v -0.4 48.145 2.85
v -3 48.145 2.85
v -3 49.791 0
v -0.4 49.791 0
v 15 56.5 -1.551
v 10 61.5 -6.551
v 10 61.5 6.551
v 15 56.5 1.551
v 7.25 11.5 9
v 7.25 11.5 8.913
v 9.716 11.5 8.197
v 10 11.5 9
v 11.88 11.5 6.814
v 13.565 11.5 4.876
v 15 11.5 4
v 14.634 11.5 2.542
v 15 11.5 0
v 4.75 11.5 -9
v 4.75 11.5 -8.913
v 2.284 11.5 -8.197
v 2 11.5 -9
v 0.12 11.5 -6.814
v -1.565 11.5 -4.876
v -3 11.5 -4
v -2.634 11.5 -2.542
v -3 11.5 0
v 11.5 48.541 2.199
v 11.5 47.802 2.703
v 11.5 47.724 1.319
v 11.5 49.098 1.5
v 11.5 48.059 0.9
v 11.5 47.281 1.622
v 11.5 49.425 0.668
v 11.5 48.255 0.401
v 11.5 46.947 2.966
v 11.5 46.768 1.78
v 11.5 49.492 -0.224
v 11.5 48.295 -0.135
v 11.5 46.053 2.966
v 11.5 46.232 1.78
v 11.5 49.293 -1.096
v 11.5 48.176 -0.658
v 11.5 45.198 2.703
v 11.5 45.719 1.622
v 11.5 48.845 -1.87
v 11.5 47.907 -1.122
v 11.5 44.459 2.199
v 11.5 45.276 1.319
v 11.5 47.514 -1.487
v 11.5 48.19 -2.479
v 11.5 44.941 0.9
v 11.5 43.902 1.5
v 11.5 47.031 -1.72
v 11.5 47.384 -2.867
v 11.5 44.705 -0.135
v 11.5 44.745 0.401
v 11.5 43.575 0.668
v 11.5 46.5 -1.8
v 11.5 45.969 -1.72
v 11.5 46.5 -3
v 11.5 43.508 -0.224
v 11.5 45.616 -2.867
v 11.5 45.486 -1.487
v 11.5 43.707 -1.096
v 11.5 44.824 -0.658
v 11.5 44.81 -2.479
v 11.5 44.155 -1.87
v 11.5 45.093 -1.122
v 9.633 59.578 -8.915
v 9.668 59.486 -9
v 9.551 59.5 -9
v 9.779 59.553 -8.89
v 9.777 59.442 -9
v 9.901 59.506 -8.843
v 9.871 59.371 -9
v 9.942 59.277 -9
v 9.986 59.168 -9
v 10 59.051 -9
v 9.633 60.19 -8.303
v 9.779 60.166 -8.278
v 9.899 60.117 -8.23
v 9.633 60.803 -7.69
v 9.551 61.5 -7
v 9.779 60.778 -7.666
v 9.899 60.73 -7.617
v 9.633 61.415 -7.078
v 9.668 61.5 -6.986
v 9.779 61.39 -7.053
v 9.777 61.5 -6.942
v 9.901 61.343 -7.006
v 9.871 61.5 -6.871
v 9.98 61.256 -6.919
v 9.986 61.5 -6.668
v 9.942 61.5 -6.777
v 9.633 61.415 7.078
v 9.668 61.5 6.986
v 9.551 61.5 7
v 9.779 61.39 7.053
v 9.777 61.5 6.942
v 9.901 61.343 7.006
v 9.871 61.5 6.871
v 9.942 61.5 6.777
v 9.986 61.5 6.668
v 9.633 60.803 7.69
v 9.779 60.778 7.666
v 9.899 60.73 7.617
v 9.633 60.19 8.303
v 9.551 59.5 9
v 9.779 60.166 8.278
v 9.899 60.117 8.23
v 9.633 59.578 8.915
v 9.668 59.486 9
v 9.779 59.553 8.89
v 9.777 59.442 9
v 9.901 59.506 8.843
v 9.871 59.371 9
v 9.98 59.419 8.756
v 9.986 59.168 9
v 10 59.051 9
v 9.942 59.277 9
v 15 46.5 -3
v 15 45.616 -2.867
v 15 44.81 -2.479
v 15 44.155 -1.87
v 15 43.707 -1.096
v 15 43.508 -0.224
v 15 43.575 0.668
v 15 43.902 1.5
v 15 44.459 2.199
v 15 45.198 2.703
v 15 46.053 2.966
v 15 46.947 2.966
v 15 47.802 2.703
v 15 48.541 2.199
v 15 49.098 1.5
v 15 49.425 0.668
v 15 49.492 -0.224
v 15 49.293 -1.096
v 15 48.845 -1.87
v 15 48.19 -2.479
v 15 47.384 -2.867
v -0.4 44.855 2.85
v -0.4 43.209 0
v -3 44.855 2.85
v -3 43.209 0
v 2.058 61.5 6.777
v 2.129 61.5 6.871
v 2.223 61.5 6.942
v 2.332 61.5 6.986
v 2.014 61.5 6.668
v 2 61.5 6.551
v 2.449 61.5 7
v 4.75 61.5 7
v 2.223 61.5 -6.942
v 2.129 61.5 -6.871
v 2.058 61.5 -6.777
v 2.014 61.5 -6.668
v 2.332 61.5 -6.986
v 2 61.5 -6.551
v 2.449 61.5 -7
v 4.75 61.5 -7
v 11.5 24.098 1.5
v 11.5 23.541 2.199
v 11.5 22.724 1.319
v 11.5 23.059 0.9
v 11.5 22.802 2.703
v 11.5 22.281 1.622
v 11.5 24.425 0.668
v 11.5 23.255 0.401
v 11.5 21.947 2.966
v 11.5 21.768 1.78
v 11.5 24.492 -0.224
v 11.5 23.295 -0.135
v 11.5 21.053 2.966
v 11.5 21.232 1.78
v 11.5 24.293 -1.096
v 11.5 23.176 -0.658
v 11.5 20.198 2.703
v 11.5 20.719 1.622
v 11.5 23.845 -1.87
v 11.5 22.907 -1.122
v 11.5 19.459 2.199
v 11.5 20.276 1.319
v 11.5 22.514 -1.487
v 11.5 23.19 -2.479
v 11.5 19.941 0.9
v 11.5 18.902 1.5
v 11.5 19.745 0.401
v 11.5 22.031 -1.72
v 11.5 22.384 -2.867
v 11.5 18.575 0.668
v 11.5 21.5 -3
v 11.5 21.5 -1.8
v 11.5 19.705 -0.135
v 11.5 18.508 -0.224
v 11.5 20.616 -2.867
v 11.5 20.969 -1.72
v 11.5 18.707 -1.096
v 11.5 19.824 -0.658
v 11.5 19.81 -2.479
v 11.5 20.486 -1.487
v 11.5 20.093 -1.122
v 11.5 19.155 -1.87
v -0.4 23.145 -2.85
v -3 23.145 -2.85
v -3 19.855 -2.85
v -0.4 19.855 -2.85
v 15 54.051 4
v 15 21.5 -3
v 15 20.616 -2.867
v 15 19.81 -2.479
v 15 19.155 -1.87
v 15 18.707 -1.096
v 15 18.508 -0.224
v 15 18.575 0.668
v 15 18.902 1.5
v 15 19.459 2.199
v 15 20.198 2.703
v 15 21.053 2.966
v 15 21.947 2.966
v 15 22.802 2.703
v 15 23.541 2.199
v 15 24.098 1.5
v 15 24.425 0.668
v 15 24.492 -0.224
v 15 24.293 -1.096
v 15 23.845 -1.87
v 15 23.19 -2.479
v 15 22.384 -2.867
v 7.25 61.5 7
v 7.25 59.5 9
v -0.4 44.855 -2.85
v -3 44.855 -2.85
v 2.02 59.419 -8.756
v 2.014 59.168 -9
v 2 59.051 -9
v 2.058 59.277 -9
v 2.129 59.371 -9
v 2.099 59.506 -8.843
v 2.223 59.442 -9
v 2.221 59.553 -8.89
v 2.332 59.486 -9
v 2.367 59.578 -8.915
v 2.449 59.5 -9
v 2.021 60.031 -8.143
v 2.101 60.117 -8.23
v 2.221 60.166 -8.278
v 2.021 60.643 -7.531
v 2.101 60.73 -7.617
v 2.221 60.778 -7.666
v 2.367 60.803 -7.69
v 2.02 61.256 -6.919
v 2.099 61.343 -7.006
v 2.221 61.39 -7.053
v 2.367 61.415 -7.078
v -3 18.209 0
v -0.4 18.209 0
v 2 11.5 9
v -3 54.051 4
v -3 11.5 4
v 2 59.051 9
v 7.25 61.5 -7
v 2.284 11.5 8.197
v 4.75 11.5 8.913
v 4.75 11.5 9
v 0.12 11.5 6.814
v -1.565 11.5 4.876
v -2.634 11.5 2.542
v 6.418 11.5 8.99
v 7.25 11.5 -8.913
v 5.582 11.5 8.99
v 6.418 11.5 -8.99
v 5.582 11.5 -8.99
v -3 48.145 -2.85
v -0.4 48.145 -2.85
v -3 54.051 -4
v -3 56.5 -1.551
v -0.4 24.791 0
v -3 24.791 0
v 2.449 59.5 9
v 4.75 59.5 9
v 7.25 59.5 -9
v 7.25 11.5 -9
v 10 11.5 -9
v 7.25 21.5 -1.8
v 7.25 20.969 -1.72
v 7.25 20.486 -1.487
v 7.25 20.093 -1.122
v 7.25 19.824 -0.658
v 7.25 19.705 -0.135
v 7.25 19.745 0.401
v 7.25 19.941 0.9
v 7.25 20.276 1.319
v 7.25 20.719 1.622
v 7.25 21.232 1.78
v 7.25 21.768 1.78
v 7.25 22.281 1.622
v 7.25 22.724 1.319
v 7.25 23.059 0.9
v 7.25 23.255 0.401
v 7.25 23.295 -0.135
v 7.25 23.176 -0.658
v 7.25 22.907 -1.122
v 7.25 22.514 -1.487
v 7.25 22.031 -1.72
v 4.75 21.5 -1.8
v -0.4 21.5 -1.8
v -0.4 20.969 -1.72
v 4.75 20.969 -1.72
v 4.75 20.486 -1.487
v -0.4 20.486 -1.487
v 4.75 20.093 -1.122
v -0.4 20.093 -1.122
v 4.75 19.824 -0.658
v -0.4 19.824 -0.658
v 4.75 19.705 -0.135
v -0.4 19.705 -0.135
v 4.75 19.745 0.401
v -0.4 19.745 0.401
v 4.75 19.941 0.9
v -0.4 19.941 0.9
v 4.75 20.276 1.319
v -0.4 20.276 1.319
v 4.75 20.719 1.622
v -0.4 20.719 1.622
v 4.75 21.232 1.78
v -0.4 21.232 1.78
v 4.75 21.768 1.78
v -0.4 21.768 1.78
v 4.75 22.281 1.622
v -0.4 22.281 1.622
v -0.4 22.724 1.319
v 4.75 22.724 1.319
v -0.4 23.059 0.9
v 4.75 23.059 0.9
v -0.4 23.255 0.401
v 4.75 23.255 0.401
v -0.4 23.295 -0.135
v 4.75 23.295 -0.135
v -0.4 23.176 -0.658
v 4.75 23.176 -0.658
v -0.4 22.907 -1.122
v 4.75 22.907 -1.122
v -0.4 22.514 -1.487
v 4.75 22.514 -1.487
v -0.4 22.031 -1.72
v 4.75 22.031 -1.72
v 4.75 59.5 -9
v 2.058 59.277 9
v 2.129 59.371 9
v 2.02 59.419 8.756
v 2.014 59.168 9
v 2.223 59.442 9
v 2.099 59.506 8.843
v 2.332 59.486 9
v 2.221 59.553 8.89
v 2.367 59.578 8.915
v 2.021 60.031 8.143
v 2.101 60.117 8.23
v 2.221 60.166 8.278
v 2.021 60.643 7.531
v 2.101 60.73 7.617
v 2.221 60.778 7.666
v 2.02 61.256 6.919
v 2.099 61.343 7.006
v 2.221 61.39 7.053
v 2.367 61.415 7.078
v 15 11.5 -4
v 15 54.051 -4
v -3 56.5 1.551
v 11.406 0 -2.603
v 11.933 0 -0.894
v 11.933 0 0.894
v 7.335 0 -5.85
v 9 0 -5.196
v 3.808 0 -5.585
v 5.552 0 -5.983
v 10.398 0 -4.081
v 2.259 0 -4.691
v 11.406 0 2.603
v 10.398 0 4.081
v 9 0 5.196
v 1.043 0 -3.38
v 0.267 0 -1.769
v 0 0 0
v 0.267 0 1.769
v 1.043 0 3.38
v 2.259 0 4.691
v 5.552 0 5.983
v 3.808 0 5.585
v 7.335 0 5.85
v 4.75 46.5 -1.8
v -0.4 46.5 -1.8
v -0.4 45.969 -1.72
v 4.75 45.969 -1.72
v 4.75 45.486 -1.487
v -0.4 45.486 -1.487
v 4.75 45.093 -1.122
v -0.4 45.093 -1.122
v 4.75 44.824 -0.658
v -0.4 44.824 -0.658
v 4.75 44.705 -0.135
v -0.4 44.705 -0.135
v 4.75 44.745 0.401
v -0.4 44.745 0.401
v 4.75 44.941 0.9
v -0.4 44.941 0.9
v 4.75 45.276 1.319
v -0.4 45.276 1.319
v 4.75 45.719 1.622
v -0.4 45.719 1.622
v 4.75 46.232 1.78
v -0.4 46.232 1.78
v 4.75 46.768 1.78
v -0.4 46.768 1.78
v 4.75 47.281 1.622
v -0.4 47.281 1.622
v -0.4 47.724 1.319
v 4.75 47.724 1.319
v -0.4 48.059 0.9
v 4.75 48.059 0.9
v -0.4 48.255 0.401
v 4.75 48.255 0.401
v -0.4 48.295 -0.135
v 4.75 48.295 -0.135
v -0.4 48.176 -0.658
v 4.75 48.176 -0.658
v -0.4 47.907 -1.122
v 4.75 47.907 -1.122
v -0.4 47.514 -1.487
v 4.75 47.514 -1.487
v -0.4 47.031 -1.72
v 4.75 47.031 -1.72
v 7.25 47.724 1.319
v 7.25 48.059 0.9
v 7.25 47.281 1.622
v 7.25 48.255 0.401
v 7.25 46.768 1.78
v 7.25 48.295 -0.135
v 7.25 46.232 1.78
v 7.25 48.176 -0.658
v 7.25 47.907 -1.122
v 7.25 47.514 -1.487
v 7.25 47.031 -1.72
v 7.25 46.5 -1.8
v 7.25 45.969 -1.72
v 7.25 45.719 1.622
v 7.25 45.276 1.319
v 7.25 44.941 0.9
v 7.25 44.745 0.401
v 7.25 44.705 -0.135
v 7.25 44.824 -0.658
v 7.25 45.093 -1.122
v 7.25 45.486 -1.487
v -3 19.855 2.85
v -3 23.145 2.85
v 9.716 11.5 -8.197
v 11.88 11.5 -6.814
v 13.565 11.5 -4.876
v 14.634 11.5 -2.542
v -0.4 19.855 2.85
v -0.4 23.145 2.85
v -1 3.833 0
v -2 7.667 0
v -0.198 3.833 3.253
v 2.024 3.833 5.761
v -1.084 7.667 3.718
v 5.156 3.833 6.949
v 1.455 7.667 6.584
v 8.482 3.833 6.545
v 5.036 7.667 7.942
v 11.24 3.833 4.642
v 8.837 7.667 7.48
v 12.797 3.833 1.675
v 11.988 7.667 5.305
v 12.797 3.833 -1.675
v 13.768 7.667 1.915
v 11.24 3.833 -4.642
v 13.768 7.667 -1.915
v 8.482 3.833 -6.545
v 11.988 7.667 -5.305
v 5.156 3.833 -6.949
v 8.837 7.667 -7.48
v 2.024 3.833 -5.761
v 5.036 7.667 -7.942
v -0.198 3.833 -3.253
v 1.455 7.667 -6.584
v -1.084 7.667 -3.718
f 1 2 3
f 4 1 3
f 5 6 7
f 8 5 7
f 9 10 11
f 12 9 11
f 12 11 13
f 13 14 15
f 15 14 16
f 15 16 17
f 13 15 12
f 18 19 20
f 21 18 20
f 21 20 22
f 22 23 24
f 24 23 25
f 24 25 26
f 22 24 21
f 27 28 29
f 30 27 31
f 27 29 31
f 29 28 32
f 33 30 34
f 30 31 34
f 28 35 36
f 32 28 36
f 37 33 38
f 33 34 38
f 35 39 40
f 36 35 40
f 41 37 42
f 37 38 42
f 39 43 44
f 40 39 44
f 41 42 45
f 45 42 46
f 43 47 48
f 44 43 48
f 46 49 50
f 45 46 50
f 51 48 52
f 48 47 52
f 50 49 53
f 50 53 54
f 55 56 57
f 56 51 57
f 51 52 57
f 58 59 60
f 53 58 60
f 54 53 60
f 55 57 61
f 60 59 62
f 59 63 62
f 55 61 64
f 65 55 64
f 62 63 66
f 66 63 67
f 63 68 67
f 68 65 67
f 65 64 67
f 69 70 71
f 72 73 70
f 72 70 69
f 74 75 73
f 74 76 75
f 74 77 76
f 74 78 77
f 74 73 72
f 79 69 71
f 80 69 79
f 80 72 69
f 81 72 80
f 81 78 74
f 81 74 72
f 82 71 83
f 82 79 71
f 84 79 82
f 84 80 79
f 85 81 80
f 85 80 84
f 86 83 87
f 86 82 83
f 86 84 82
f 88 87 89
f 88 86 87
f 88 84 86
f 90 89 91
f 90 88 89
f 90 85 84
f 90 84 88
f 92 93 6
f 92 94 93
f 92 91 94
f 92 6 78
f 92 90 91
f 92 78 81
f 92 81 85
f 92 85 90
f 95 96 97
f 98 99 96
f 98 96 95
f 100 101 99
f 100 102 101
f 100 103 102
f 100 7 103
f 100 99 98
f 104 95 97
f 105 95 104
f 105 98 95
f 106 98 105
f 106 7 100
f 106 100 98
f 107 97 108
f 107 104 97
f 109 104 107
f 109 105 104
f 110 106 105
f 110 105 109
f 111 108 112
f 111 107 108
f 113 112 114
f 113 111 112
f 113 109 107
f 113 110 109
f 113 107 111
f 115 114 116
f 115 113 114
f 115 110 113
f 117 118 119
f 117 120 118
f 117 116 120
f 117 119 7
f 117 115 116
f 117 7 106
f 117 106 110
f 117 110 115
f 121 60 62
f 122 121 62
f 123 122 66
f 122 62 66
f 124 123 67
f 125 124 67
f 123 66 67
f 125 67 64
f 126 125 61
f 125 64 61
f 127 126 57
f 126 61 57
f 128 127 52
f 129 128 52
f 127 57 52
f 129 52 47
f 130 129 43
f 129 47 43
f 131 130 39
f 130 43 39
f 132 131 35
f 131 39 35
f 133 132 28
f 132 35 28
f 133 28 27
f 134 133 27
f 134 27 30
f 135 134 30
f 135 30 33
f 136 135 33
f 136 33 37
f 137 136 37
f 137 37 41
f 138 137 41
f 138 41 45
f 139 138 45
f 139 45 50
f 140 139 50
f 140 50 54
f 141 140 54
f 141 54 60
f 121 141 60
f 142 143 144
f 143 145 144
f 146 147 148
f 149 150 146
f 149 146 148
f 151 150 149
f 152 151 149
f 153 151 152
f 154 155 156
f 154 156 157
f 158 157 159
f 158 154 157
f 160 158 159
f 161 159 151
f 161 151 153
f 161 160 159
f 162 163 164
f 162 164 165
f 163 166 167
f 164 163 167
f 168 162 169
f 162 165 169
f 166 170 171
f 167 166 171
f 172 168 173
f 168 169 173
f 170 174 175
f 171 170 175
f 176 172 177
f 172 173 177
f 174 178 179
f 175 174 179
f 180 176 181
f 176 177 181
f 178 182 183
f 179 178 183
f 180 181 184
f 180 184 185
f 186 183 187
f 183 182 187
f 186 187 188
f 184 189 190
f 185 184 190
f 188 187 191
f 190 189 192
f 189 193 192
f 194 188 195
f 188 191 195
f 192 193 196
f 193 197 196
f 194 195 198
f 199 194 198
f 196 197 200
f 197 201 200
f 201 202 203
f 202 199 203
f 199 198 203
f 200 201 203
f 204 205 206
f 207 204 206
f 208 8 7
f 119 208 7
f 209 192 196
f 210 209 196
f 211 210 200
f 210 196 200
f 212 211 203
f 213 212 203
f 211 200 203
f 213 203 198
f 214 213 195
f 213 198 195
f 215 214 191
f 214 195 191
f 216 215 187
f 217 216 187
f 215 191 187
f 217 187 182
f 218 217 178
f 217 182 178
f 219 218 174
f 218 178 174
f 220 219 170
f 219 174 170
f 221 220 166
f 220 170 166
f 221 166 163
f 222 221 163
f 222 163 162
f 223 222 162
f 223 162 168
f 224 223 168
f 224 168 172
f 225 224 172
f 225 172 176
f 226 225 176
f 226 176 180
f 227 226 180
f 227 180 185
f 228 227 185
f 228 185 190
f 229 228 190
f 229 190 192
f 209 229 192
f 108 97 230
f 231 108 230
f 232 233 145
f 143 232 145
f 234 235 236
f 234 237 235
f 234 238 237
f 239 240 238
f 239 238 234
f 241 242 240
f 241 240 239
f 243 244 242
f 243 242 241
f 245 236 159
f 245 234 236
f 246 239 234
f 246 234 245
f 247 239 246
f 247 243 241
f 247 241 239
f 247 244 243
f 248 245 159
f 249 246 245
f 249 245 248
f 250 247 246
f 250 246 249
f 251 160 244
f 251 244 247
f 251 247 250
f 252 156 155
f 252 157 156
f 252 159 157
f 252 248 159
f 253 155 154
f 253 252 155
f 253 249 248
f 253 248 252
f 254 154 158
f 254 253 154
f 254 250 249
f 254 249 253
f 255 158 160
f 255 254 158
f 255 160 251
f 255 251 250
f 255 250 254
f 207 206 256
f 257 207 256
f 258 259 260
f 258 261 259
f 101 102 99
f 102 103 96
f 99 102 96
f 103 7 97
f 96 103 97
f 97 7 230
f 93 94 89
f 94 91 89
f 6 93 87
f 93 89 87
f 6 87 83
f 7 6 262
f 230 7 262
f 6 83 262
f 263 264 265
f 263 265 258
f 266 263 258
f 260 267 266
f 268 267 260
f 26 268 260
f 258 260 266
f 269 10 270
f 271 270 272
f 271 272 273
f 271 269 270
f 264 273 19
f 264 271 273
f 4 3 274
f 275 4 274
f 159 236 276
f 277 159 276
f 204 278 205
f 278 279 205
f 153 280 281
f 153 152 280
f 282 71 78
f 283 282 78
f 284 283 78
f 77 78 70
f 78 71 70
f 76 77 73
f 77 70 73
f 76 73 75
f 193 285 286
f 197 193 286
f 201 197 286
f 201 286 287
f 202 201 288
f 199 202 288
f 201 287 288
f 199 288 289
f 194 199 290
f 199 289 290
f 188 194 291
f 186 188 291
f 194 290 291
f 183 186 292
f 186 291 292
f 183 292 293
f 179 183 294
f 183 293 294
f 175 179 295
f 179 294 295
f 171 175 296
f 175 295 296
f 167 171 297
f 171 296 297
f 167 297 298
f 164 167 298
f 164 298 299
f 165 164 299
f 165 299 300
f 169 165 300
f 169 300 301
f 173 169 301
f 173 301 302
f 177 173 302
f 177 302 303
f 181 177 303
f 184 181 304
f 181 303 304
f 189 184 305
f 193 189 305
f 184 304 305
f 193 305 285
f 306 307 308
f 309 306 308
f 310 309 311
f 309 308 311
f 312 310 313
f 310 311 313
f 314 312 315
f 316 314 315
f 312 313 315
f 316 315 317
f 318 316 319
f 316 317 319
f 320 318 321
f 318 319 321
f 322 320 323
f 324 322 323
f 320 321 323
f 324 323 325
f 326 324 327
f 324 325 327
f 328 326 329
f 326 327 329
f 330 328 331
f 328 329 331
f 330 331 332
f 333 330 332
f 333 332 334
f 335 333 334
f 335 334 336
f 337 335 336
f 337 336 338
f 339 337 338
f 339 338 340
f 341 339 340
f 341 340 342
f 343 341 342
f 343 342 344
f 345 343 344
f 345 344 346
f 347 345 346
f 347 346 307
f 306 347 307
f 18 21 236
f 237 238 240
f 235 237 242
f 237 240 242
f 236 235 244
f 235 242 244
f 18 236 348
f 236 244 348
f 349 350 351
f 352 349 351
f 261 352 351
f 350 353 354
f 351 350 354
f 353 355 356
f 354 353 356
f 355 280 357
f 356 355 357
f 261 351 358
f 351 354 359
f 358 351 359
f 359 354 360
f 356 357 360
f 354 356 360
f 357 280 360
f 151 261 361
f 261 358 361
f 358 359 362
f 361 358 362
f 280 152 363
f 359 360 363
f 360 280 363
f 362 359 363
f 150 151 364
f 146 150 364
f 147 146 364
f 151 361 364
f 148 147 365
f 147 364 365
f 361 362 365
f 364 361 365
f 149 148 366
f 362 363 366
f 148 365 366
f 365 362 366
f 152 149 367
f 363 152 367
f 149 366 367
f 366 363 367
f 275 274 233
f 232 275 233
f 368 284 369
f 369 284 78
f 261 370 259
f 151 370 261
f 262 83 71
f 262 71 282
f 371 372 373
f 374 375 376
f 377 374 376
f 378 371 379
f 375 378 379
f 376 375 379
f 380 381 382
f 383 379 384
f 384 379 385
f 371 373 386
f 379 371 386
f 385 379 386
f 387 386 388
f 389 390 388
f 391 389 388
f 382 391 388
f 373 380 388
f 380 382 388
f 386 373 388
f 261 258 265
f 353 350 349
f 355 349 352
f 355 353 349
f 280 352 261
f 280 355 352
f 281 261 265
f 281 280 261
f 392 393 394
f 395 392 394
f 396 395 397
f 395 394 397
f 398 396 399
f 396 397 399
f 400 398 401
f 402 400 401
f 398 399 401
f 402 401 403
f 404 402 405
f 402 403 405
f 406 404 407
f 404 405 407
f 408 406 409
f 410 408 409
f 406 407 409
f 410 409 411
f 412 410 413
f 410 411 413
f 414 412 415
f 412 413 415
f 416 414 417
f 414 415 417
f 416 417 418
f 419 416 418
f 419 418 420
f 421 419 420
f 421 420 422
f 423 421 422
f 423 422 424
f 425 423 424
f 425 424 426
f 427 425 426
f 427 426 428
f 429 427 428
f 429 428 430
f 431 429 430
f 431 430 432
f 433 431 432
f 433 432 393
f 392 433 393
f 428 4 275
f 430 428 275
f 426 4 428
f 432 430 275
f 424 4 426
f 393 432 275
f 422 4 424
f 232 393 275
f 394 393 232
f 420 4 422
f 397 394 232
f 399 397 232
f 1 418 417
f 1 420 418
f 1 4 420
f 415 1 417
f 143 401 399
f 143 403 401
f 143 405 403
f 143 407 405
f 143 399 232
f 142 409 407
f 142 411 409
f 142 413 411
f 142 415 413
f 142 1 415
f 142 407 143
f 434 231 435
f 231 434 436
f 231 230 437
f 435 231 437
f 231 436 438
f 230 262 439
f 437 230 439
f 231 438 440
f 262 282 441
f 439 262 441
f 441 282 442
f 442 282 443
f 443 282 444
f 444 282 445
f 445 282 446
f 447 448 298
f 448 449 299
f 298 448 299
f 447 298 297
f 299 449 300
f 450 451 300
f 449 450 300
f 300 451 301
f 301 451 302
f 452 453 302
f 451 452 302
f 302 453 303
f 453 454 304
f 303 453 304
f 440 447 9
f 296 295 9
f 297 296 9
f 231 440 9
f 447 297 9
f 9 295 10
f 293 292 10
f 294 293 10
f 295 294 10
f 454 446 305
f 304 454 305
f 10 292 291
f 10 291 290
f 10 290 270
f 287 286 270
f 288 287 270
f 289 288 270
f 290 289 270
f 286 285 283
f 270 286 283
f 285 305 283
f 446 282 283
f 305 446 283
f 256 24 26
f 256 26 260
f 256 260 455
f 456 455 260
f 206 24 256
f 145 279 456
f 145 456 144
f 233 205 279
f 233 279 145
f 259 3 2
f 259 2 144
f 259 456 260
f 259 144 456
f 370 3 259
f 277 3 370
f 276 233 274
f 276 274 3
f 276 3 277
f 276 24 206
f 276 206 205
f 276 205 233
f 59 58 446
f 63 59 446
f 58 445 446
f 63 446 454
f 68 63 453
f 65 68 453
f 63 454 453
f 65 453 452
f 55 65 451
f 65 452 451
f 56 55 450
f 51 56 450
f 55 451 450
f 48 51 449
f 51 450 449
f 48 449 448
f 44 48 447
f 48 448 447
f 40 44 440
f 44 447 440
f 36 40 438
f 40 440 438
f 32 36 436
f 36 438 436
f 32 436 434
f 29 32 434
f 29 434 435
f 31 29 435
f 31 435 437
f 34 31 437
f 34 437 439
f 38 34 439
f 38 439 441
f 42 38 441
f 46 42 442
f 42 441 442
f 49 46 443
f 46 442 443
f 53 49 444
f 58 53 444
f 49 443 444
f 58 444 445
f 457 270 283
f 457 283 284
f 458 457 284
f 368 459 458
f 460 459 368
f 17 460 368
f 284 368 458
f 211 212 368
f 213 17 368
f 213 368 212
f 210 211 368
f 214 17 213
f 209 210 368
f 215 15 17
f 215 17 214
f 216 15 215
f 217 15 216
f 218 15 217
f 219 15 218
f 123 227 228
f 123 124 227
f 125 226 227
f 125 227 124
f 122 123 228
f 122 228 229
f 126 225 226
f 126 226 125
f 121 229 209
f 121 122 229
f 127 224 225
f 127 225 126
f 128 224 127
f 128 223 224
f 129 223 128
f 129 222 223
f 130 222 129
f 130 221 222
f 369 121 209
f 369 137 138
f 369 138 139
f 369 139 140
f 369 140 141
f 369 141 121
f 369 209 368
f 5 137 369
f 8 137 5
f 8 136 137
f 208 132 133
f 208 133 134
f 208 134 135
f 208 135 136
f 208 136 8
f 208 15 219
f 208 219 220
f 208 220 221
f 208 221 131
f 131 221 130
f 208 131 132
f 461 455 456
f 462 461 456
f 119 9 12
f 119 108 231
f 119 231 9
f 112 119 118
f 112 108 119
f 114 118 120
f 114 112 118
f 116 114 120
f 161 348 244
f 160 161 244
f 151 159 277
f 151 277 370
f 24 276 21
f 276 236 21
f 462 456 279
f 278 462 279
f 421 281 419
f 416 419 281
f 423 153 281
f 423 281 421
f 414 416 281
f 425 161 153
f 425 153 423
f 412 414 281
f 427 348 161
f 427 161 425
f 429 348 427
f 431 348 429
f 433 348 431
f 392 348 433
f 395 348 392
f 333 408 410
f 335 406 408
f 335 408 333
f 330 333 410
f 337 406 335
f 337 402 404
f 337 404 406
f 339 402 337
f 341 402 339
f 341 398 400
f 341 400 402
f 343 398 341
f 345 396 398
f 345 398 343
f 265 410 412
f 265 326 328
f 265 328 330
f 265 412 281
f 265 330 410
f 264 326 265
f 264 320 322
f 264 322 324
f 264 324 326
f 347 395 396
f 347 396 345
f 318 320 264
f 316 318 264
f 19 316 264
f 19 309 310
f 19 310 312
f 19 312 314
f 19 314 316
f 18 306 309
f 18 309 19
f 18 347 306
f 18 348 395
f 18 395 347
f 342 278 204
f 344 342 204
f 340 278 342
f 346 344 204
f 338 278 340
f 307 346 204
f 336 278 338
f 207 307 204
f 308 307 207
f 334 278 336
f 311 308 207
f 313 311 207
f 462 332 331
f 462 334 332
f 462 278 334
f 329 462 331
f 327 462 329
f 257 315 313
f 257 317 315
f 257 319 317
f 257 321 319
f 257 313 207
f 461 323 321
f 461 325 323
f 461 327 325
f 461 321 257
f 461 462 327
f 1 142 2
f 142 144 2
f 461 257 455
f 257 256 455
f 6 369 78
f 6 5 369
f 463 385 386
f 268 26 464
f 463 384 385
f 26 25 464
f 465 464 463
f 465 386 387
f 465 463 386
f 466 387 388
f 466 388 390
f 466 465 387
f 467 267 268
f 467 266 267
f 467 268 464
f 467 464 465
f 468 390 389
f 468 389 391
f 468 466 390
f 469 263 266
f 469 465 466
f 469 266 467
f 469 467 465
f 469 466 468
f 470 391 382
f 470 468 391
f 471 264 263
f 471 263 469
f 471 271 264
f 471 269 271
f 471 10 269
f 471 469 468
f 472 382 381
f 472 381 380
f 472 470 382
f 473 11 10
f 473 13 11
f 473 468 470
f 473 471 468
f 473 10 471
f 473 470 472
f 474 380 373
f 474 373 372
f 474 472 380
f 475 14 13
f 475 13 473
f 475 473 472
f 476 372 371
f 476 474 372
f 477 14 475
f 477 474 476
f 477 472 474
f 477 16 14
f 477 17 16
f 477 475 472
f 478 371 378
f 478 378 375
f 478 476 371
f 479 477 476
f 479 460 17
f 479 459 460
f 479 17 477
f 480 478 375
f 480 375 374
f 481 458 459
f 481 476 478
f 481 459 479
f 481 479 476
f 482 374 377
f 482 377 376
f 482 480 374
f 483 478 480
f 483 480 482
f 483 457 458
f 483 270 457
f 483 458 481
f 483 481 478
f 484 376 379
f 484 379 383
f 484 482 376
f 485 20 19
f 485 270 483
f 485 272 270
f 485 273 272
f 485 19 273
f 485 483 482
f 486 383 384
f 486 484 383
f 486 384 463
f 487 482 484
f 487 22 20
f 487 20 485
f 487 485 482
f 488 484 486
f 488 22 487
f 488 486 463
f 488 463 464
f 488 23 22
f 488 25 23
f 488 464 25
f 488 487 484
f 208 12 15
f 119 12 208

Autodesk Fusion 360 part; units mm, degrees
sketch "Skizze1" plane through (0, 0, 0) normal (0, 0, 1) x (1, 0, 0)
  line L0 (0, 0) -> (12, 0)
  line L1 (6, 0) -> (6, 11.5)
  line L2 (6, 11.5) -> (15, 11.5)
  line L3 (6, 11.5) -> (-3, 11.5)
  line L4 (-3, 11.5) -> (0, 0)
  line L5 (12, 0) -> (15, 11.5)
  line L6 (6, 11.5) -> (7.25, 11.5)
  line L7 (6, 11.5) -> (4.75, 11.5)
  line L8 (7.25, 11.5) -> (15, 11.5)
  line L9 (15, 11.5) -> (15, 61.5)
  line L10 (15, 61.5) -> (7.25, 61.5)
  line L11 (7.25, 61.5) -> (7.25, 11.5)
  line L12 (4.75, 11.5) -> (-3, 11.5)
  line L13 (-3, 11.5) -> (-3, 61.5)
  line L14 (-3, 61.5) -> (4.75, 61.5)
  line L15 (4.75, 61.5) -> (4.75, 11.5)
  dimension "d1" = 12
  dimension "d2" = 11.5
  dimension "d3" = 9
  dimension "d4" = 9
  dimension "d5" = 1.25
  dimension "d6" = 1.25
  dimension "d7" = 50
  dimension "d8" = 50
revolve "Drehen1" add sketch "Skizze1" angle 360 about axis through (6, 0, 0) along (0, 1, 0) contours L0 L1 L3 L4 L7 L12
extrude "Extrusion1" add sketch "Skizze1" along normal blind 9 contours L3 L12 L13 L14 L15 | L2 L8 L9 L10 L11
extrude "Extrusion2" add sketch "Skizze1" against normal blind 9 contours L3 L12 L13 L14 L15 | L2 L8 L9 L10 L11
chamfer "Fase1" distance 5 angle 45 6 edges at (-3, 61.5, 0) (-3, 36.5, 9) (-3, 36.5, -9) (15, 36.5, 9) (15, 36.5, -9) (15, 61.5, 0)
sketch "Skizze2" plane through (15, 0, 0) normal (1, 0, 0) x (0, 1, 0)
  line L0 (56.5, 4) -> (11.5, 4)
  line L1 (11.5, 4) -> (11.5, 0)
  line L2 (11.5, 0) -> (11.5, -4)
  line L3 (11.5, -4) -> (56.5, -4)
  line L4 (56.5, -4) -> (56.5, 4)
  line L5 (11.5, 0) -> (21.5, 0)
  line L6 (56.5, 0) -> (46.5, 0)
  dimension "d15" = 10
  dimension "d16" = 10
sketch "Skizze3" plane through (-3, 0, 0) normal (-1, 0, 0) x (0, -1, 0)
  line L0 (-56.5, -4) -> (-11.5, -4)
  line L1 (-11.5, -4) -> (-11.5, 0)
  line L2 (-11.5, 0) -> (-11.5, 4)
  line L3 (-11.5, 4) -> (-56.5, 4)
  line L4 (-56.5, 4) -> (-56.5, -4)
  line L5 (-11.5, 0) -> (-21.5, 0)
  line L6 (-56.5, 0) -> (-46.5, 0)
  line L7 (-48.1454, 2.85) -> (-49.7909, 0)
  line L8 (-49.7909, 0) -> (-48.1454, -2.85)
  line L9 (-48.1454, -2.85) -> (-44.8546, -2.85)
  line L10 (-44.8546, -2.85) -> (-43.2091, 0)
  line L11 (-43.2091, 0) -> (-44.8546, 2.85)
  line L12 (-44.8546, 2.85) -> (-48.1454, 2.85)
  line L13 (-23.1454, 2.85) -> (-24.7909, 0)
  line L14 (-24.7909, 0) -> (-23.1454, -2.85)
  line L15 (-23.1454, -2.85) -> (-19.8546, -2.85)
  line L16 (-19.8546, -2.85) -> (-18.2091, 0)
  line L17 (-18.2091, 0) -> (-19.8546, 2.85)
  line L18 (-19.8546, 2.85) -> (-23.1454, 2.85)
  point P0 (-56.5, 0)
  point P1 (-46.5, 0)
  point P2 (-21.5, 0)
  dimension "d17" = 10
  dimension "d18" = 10
  dimension "d29" = 2.85
  dimension "d30" = 2.85
hole "Bohrung1" at (15, 46.5, 0) direction (-1, 0, 0) diameter 3.6 depth 25 tip angle 180 counterbore diameter 6 counterbore depth 3.5
hole "Bohrung2" at (15, 21.5, 0) direction (-1, 0, 0) diameter 3.6 depth 25 tip angle 180 counterbore diameter 6 counterbore depth 3.5
extrude "Extrusion3" cut sketch "Skizze3" against normal blind 2.6 contours L13 L14 L15 L16 L17 L18 | L7 L8 L9 L10 L11 L12
chamfer "Fase2" distance 2 angle 45 8 edges at (8.625, 61.5, 9) (12.5, 59, 6.5) (12.5, 59, -6.5) (8.625, 61.5, -9) (-0.5, 59, -6.5) (3.375, 61.5, -9) (-0.5, 59, 6.5) (3.375, 61.5, 9)
